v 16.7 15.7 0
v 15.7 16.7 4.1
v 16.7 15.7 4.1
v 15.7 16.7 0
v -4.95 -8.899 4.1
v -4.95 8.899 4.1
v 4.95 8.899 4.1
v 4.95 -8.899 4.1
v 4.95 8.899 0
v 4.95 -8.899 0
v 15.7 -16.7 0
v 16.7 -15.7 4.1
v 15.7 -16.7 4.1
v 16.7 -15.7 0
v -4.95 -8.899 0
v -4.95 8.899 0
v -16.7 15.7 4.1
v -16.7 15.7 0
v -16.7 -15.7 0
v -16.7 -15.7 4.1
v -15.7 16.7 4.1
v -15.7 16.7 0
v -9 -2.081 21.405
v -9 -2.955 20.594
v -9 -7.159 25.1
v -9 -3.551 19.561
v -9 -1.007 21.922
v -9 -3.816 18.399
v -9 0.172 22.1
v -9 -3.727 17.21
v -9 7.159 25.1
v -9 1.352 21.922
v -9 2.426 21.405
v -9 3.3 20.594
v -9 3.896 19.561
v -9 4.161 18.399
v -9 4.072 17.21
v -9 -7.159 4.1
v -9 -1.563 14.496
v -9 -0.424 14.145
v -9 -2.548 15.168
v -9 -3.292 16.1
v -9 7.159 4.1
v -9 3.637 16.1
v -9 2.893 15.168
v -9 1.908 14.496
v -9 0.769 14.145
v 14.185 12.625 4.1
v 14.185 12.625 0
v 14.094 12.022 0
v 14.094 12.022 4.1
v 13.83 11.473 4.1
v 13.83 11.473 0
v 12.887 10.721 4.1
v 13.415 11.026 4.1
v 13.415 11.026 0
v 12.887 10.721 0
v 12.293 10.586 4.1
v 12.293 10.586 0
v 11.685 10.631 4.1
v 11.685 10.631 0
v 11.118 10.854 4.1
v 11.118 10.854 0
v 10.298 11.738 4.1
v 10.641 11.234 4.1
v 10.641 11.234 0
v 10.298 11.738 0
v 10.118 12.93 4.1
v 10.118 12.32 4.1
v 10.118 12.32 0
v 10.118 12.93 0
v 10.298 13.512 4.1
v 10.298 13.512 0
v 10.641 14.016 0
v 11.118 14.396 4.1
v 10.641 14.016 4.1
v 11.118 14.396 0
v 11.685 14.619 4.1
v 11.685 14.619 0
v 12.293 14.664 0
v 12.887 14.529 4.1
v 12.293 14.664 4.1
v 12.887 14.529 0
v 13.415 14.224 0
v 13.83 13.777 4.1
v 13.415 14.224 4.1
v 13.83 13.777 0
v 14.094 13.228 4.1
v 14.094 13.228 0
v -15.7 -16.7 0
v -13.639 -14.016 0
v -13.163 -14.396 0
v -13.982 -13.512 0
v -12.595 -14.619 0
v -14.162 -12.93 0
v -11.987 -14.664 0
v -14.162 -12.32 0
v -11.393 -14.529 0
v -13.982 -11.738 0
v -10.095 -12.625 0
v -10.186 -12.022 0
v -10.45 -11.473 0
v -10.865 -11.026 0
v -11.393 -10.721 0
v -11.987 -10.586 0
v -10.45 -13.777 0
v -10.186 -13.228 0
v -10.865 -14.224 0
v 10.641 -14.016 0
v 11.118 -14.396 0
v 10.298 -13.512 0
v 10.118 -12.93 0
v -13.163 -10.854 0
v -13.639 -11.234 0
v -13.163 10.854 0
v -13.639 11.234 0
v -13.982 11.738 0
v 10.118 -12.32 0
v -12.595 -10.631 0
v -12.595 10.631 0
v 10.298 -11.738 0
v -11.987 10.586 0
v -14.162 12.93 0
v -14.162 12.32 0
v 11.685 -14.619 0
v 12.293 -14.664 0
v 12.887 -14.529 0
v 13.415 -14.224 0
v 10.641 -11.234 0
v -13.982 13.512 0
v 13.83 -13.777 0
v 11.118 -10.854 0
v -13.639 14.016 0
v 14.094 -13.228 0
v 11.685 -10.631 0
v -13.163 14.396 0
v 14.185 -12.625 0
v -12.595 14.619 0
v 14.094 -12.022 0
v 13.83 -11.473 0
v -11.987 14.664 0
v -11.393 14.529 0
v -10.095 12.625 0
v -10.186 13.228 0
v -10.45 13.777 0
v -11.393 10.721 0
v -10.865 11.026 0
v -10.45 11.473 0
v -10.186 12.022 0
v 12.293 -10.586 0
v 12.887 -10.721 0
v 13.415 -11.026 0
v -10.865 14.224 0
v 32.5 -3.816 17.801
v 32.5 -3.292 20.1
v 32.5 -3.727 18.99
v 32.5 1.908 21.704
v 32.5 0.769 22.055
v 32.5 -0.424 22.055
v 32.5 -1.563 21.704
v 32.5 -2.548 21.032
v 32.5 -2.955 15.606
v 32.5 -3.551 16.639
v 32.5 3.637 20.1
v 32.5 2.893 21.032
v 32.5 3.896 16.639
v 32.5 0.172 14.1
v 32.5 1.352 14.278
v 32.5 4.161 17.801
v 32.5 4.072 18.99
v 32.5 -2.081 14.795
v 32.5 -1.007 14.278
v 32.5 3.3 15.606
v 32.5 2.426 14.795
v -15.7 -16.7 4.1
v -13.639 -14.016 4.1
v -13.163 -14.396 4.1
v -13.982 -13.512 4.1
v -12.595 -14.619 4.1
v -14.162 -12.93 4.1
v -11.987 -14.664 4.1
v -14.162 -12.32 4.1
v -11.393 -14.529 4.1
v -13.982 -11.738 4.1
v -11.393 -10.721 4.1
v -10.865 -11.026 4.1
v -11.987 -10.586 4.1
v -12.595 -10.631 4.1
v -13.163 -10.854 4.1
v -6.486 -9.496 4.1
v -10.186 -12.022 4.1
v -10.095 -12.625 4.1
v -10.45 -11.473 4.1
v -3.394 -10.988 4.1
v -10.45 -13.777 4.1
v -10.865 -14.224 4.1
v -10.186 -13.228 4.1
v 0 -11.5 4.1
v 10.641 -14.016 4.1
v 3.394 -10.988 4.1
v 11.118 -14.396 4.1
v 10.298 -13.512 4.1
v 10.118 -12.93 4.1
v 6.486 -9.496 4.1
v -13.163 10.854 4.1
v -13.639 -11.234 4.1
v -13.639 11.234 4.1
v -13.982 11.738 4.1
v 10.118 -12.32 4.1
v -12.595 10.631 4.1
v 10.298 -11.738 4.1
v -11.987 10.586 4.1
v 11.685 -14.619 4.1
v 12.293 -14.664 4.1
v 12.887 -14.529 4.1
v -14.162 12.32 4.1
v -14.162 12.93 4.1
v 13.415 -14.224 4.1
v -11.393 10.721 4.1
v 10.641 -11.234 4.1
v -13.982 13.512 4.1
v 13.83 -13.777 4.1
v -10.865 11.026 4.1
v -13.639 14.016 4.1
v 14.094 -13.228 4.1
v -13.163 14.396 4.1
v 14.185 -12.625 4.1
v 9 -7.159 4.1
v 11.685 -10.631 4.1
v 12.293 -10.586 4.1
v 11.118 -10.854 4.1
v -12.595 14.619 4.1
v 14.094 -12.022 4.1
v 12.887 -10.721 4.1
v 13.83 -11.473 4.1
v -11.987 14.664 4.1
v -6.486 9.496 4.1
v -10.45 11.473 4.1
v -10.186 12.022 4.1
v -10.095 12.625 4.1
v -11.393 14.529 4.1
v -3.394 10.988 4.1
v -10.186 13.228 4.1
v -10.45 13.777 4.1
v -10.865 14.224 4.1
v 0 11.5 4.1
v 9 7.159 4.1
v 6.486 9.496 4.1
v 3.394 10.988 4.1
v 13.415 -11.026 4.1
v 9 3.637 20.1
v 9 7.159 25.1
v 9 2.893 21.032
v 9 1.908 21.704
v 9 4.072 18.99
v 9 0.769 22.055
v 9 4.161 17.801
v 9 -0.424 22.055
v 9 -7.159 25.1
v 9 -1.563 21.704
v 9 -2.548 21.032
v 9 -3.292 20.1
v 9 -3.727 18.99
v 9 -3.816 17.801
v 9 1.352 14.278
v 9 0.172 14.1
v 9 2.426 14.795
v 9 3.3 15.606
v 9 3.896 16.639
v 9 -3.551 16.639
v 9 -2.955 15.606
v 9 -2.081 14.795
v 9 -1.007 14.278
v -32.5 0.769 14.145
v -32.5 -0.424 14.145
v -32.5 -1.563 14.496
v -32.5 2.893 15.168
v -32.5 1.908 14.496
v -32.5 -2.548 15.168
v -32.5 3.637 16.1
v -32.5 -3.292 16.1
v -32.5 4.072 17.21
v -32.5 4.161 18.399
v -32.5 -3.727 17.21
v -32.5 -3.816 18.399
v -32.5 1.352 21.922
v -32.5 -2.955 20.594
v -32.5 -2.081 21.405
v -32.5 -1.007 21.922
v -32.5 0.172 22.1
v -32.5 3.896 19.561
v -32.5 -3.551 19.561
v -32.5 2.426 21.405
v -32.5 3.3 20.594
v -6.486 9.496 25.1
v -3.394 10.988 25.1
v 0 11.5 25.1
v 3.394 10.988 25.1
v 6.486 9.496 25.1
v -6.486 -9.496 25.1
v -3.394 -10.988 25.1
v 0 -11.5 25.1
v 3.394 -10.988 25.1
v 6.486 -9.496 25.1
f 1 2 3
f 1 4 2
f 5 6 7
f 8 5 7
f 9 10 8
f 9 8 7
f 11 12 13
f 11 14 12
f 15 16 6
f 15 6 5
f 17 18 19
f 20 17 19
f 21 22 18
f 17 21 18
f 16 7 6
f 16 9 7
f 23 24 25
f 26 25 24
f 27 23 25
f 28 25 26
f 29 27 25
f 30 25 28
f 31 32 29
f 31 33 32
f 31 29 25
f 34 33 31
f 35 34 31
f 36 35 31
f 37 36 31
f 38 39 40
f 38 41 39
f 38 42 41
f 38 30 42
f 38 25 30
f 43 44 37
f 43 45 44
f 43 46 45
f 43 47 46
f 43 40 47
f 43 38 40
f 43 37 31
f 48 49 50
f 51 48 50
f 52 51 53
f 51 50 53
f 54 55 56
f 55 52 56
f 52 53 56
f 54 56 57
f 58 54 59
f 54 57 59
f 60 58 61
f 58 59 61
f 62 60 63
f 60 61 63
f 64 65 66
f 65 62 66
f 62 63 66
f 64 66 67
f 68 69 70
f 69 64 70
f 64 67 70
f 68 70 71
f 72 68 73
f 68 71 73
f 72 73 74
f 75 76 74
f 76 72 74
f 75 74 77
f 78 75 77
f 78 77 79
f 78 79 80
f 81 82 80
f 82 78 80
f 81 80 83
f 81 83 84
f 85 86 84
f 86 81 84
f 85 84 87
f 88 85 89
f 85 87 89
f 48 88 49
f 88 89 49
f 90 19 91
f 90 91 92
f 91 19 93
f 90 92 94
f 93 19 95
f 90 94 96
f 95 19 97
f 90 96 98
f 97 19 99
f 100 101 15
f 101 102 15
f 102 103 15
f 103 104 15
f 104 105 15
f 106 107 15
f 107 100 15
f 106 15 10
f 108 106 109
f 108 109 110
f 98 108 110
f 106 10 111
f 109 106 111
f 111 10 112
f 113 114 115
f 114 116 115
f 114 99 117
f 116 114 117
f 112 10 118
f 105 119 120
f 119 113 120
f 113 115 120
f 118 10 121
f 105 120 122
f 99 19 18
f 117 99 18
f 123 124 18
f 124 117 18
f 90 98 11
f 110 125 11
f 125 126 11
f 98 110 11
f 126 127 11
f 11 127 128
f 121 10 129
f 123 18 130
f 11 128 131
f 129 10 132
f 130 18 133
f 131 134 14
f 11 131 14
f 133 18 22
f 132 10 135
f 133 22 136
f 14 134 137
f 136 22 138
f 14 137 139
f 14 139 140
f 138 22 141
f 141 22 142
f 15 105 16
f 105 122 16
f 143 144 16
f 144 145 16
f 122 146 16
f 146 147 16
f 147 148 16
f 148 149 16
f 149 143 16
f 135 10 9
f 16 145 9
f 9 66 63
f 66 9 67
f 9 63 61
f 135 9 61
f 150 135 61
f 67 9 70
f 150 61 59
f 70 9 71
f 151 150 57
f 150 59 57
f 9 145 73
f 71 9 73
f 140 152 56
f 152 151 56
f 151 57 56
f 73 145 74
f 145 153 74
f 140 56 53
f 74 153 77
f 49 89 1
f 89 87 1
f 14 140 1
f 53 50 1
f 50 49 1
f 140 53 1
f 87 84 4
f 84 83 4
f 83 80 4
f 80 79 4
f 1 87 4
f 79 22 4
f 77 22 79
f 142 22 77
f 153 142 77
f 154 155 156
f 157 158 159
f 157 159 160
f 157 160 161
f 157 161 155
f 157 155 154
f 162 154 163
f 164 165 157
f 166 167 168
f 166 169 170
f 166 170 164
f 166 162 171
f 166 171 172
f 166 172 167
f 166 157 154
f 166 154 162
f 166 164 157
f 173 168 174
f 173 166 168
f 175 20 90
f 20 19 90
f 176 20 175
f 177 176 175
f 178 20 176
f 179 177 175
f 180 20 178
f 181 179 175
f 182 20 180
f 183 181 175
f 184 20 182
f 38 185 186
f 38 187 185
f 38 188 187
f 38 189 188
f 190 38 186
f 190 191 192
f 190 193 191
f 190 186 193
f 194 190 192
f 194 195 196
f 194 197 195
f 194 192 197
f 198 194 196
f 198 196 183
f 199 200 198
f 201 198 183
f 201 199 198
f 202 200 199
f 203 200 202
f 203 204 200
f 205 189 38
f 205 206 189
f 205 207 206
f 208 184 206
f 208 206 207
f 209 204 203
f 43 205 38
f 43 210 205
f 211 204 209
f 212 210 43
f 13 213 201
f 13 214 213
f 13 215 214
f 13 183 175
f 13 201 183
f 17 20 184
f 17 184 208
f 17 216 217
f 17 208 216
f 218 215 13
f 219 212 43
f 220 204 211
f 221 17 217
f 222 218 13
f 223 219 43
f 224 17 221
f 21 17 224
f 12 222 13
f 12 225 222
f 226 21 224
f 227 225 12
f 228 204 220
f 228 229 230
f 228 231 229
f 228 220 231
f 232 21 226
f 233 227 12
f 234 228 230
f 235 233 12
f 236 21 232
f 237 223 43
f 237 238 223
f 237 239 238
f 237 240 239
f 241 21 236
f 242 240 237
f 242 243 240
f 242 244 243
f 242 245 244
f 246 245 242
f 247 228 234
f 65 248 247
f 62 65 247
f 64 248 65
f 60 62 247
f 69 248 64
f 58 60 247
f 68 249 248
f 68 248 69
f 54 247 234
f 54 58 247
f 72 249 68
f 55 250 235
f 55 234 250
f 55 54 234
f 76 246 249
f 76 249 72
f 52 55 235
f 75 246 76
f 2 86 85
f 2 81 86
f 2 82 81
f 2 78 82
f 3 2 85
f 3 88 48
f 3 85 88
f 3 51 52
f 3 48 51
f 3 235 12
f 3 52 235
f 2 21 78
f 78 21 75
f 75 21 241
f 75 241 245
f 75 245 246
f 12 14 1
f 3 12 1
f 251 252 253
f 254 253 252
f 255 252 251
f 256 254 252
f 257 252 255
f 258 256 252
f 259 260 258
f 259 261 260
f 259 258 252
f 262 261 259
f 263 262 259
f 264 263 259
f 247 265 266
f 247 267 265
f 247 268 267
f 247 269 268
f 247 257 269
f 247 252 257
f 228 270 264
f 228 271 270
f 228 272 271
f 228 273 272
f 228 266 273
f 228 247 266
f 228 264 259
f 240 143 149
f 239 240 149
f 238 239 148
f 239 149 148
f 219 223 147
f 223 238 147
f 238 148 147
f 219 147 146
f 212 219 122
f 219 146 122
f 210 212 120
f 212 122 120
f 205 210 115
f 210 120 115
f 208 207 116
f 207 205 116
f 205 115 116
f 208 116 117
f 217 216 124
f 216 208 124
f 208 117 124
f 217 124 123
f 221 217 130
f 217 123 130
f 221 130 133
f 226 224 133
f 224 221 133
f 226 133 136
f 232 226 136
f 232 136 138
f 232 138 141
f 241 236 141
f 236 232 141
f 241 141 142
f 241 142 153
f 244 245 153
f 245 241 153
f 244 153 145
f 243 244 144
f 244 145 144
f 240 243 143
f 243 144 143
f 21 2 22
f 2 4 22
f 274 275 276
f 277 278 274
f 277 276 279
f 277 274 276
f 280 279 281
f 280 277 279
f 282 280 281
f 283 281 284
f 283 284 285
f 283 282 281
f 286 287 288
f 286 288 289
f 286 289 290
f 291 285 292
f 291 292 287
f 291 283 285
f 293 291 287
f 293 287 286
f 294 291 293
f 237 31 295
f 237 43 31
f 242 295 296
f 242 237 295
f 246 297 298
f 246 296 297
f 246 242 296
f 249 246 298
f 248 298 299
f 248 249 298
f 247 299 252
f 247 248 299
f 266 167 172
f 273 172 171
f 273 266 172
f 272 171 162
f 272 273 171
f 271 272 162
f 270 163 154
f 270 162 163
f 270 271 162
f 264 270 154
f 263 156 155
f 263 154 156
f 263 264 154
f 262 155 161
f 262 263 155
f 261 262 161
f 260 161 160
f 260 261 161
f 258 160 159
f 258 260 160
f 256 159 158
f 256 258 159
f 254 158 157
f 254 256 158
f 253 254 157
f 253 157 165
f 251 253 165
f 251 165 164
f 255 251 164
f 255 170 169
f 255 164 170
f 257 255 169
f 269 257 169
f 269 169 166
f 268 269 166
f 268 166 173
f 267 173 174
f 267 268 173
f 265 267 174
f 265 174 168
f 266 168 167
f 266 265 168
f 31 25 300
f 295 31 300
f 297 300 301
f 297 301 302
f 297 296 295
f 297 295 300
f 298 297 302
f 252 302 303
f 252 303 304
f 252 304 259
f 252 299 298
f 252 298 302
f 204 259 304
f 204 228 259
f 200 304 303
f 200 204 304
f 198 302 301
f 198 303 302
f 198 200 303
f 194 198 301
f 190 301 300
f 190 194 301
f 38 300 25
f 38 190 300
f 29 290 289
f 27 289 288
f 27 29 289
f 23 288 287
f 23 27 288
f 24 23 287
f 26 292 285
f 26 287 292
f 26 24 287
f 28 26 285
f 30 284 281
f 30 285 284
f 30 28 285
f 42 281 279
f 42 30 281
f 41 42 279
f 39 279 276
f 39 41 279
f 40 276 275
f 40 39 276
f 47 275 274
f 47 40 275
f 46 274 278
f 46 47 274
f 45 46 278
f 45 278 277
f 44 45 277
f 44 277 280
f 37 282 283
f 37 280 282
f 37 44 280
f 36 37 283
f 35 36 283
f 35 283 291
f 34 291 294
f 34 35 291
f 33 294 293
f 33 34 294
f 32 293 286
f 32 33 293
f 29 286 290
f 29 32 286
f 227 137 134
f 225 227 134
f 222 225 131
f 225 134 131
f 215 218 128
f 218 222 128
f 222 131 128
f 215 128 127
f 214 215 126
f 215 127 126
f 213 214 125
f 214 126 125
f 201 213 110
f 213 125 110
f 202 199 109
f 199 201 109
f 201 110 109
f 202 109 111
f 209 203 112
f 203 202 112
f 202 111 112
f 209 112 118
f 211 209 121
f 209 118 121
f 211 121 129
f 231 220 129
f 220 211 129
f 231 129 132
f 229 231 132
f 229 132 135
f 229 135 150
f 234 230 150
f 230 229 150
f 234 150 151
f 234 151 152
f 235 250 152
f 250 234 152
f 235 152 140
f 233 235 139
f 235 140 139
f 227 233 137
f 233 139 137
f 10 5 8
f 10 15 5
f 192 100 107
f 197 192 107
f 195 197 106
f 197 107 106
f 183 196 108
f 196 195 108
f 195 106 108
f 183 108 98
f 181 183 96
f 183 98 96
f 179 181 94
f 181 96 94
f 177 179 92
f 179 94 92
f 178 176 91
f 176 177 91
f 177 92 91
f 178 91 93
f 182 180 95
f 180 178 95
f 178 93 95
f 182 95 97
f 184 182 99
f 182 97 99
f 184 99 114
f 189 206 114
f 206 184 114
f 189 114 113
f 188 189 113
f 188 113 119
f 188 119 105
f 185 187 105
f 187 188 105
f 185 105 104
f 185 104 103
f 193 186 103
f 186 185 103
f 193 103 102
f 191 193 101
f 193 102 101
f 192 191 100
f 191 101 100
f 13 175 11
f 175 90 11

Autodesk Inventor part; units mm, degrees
ref_plane "YZ Plane" through (0, 0, 0) normal (1, 0, 0) x (0, 1, 0)
ref_plane "XZ Plane" through (0, 0, 0) normal (0, 1, 0) x (-1, 0, 0)
ref_plane "XY Plane" through (0, 0, 0) normal (0, 0, 1) x (1, 0, 0)
sketch "Sketch3" plane through (0, 0, 0) normal (0, 0, 1) x (1, 0, 0)
  line L0 (-15.7, -16.7) -> (15.7, -16.7)
  line L1 (16.7, -15.7) -> (16.7, 15.7)
  line L2 (15.7, 16.7) -> (-15.7, 16.7)
  line L3 (-16.7, 15.7) -> (-16.7, -15.7)
  line L4 (-16.7, -16.7) -> (16.7, 16.7) construction
  line L5 (16.7, -16.7) -> (-16.7, 16.7) construction
  line L6 (-15.7, 16.7) -> (-16.7, 15.7)
  line L7 (15.7, 16.7) -> (16.7, 15.7)
  line L8 (16.7, -15.7) -> (15.7, -16.7)
  line L9 (-16.7, -15.7) -> (-15.7, -16.7)
  line L10 (-4.9497, -8.8994) -> (4.9497, -8.8994)
  line L11 (4.9497, -8.8994) -> (4.9497, 8.8994)
  line L12 (4.9497, 8.8994) -> (-4.9497, 8.8994)
  line L13 (-4.9497, 8.8994) -> (-4.9497, -8.8994)
  line L14 (-4.9497, -8.8994) -> (4.9497, 8.8994) construction
  line L15 (4.9497, -8.8994) -> (-4.9497, 8.8994) construction
  circle A0 centre (-12.14, 12.625) radius 2.045
  circle A1 centre (12.14, 12.625) radius 2.045
  line L16 (0, -16.7) -> (0, 16.7) construction
  circle A2 centre (-12.14, -12.625) radius 2.045
  circle A3 centre (12.14, -12.625) radius 2.045
  line L17 (12.14, 12.625) -> (-12.14, 12.625) construction
  line L18 (-12.14, 12.625) -> (-12.14, -12.625) construction
  line L19 (-12.14, -12.625) -> (12.14, -12.625) construction
  line L20 (12.14, -12.625) -> (12.14, 12.625) construction
  line L21 (-16.7, 0) -> (16.7, 0) construction
  point P0 (0, 0)
  point P1 (0, 0)
  dimension "d0" = 33.4
  dimension "d1" = 33.4
  dimension "d2" = 1
  dimension "d3" = 1
  dimension "d4" = 1
  dimension "d5" = 1
  dimension "d6" = 1
  dimension "d7" = 1
  dimension "d8" = 1
  dimension "d9" = 1
  dimension "d10" = 9.8994
  dimension "d11" = 17.7988
  dimension "d12" = 4.09
  dimension "d13" = 4.09
  dimension "d17" = 4.09
  dimension "d19" = 24.28
  dimension "d20" = 25.25
  dimension "d21" = 4.09
  dimension "d22" = 12.625
  dimension "d23" = 12.14
extrude "Extrusion1" add sketch "Sketch3" along normal blind 4.1
sketch "Sketch6" plane through (0, 0, 4.1) normal (0, 0, 1) x (1, 0, 0)
  line L0 (9, 7.1589) -> (9, -7.1589)
  line L1 (-9, -7.1589) -> (-9, 7.1589)
  arc A0 (-9, -7.1589) -> (9, -7.1589) centre (0, 0) ccw
  arc A1 (9, 7.1589) -> (-9, 7.1589) centre (0, 0) ccw
  dimension "d66" = 18
  dimension "d67" = 11.5
  dimension "d68" = 11.5
  dimension "d69" = 9
extrude "Extrusion4" add sketch "Sketch6" along normal blind 21
sketch "Sketch7" plane through (9, -7.1589, 4.1) normal (1, 0, 0) x (0, 0, -1)
  circle A0 centre (-14, 7.3314) radius 4
  line L0 (-21, 0) -> (-21, 14.3178) projected
  point P0 (4.1, 7.1589)
  dimension "d58" = 8
  dimension "d59" = 7
extrude "Extrusion5" add sketch "Sketch7" along normal blind 23.5
sketch "Sketch8" plane through (-9, -7.1589, 4.1) normal (-1, 0, 0) x (0, 0, 1)
  circle A0 centre (14, 7.3314) radius 4
  line L0 (21, 14.3178) -> (21, 0) projected
  point P0 (-4.1, 7.1589)
  dimension "d62" = 8
  dimension "d63" = 7
extrude "Extrusion6" add sketch "Sketch8" along normal blind 23.5
equation "\"d3\" = d2"
equation "\"d5\" = d4"
equation "\"d6\" = d4"
equation "\"d7\" = d6"
equation "\"d8\" = d4"
equation "\"d9\" = d8"
properties part number "coaxToWaveguidWG18" material "Brass, Soft Yellow"
